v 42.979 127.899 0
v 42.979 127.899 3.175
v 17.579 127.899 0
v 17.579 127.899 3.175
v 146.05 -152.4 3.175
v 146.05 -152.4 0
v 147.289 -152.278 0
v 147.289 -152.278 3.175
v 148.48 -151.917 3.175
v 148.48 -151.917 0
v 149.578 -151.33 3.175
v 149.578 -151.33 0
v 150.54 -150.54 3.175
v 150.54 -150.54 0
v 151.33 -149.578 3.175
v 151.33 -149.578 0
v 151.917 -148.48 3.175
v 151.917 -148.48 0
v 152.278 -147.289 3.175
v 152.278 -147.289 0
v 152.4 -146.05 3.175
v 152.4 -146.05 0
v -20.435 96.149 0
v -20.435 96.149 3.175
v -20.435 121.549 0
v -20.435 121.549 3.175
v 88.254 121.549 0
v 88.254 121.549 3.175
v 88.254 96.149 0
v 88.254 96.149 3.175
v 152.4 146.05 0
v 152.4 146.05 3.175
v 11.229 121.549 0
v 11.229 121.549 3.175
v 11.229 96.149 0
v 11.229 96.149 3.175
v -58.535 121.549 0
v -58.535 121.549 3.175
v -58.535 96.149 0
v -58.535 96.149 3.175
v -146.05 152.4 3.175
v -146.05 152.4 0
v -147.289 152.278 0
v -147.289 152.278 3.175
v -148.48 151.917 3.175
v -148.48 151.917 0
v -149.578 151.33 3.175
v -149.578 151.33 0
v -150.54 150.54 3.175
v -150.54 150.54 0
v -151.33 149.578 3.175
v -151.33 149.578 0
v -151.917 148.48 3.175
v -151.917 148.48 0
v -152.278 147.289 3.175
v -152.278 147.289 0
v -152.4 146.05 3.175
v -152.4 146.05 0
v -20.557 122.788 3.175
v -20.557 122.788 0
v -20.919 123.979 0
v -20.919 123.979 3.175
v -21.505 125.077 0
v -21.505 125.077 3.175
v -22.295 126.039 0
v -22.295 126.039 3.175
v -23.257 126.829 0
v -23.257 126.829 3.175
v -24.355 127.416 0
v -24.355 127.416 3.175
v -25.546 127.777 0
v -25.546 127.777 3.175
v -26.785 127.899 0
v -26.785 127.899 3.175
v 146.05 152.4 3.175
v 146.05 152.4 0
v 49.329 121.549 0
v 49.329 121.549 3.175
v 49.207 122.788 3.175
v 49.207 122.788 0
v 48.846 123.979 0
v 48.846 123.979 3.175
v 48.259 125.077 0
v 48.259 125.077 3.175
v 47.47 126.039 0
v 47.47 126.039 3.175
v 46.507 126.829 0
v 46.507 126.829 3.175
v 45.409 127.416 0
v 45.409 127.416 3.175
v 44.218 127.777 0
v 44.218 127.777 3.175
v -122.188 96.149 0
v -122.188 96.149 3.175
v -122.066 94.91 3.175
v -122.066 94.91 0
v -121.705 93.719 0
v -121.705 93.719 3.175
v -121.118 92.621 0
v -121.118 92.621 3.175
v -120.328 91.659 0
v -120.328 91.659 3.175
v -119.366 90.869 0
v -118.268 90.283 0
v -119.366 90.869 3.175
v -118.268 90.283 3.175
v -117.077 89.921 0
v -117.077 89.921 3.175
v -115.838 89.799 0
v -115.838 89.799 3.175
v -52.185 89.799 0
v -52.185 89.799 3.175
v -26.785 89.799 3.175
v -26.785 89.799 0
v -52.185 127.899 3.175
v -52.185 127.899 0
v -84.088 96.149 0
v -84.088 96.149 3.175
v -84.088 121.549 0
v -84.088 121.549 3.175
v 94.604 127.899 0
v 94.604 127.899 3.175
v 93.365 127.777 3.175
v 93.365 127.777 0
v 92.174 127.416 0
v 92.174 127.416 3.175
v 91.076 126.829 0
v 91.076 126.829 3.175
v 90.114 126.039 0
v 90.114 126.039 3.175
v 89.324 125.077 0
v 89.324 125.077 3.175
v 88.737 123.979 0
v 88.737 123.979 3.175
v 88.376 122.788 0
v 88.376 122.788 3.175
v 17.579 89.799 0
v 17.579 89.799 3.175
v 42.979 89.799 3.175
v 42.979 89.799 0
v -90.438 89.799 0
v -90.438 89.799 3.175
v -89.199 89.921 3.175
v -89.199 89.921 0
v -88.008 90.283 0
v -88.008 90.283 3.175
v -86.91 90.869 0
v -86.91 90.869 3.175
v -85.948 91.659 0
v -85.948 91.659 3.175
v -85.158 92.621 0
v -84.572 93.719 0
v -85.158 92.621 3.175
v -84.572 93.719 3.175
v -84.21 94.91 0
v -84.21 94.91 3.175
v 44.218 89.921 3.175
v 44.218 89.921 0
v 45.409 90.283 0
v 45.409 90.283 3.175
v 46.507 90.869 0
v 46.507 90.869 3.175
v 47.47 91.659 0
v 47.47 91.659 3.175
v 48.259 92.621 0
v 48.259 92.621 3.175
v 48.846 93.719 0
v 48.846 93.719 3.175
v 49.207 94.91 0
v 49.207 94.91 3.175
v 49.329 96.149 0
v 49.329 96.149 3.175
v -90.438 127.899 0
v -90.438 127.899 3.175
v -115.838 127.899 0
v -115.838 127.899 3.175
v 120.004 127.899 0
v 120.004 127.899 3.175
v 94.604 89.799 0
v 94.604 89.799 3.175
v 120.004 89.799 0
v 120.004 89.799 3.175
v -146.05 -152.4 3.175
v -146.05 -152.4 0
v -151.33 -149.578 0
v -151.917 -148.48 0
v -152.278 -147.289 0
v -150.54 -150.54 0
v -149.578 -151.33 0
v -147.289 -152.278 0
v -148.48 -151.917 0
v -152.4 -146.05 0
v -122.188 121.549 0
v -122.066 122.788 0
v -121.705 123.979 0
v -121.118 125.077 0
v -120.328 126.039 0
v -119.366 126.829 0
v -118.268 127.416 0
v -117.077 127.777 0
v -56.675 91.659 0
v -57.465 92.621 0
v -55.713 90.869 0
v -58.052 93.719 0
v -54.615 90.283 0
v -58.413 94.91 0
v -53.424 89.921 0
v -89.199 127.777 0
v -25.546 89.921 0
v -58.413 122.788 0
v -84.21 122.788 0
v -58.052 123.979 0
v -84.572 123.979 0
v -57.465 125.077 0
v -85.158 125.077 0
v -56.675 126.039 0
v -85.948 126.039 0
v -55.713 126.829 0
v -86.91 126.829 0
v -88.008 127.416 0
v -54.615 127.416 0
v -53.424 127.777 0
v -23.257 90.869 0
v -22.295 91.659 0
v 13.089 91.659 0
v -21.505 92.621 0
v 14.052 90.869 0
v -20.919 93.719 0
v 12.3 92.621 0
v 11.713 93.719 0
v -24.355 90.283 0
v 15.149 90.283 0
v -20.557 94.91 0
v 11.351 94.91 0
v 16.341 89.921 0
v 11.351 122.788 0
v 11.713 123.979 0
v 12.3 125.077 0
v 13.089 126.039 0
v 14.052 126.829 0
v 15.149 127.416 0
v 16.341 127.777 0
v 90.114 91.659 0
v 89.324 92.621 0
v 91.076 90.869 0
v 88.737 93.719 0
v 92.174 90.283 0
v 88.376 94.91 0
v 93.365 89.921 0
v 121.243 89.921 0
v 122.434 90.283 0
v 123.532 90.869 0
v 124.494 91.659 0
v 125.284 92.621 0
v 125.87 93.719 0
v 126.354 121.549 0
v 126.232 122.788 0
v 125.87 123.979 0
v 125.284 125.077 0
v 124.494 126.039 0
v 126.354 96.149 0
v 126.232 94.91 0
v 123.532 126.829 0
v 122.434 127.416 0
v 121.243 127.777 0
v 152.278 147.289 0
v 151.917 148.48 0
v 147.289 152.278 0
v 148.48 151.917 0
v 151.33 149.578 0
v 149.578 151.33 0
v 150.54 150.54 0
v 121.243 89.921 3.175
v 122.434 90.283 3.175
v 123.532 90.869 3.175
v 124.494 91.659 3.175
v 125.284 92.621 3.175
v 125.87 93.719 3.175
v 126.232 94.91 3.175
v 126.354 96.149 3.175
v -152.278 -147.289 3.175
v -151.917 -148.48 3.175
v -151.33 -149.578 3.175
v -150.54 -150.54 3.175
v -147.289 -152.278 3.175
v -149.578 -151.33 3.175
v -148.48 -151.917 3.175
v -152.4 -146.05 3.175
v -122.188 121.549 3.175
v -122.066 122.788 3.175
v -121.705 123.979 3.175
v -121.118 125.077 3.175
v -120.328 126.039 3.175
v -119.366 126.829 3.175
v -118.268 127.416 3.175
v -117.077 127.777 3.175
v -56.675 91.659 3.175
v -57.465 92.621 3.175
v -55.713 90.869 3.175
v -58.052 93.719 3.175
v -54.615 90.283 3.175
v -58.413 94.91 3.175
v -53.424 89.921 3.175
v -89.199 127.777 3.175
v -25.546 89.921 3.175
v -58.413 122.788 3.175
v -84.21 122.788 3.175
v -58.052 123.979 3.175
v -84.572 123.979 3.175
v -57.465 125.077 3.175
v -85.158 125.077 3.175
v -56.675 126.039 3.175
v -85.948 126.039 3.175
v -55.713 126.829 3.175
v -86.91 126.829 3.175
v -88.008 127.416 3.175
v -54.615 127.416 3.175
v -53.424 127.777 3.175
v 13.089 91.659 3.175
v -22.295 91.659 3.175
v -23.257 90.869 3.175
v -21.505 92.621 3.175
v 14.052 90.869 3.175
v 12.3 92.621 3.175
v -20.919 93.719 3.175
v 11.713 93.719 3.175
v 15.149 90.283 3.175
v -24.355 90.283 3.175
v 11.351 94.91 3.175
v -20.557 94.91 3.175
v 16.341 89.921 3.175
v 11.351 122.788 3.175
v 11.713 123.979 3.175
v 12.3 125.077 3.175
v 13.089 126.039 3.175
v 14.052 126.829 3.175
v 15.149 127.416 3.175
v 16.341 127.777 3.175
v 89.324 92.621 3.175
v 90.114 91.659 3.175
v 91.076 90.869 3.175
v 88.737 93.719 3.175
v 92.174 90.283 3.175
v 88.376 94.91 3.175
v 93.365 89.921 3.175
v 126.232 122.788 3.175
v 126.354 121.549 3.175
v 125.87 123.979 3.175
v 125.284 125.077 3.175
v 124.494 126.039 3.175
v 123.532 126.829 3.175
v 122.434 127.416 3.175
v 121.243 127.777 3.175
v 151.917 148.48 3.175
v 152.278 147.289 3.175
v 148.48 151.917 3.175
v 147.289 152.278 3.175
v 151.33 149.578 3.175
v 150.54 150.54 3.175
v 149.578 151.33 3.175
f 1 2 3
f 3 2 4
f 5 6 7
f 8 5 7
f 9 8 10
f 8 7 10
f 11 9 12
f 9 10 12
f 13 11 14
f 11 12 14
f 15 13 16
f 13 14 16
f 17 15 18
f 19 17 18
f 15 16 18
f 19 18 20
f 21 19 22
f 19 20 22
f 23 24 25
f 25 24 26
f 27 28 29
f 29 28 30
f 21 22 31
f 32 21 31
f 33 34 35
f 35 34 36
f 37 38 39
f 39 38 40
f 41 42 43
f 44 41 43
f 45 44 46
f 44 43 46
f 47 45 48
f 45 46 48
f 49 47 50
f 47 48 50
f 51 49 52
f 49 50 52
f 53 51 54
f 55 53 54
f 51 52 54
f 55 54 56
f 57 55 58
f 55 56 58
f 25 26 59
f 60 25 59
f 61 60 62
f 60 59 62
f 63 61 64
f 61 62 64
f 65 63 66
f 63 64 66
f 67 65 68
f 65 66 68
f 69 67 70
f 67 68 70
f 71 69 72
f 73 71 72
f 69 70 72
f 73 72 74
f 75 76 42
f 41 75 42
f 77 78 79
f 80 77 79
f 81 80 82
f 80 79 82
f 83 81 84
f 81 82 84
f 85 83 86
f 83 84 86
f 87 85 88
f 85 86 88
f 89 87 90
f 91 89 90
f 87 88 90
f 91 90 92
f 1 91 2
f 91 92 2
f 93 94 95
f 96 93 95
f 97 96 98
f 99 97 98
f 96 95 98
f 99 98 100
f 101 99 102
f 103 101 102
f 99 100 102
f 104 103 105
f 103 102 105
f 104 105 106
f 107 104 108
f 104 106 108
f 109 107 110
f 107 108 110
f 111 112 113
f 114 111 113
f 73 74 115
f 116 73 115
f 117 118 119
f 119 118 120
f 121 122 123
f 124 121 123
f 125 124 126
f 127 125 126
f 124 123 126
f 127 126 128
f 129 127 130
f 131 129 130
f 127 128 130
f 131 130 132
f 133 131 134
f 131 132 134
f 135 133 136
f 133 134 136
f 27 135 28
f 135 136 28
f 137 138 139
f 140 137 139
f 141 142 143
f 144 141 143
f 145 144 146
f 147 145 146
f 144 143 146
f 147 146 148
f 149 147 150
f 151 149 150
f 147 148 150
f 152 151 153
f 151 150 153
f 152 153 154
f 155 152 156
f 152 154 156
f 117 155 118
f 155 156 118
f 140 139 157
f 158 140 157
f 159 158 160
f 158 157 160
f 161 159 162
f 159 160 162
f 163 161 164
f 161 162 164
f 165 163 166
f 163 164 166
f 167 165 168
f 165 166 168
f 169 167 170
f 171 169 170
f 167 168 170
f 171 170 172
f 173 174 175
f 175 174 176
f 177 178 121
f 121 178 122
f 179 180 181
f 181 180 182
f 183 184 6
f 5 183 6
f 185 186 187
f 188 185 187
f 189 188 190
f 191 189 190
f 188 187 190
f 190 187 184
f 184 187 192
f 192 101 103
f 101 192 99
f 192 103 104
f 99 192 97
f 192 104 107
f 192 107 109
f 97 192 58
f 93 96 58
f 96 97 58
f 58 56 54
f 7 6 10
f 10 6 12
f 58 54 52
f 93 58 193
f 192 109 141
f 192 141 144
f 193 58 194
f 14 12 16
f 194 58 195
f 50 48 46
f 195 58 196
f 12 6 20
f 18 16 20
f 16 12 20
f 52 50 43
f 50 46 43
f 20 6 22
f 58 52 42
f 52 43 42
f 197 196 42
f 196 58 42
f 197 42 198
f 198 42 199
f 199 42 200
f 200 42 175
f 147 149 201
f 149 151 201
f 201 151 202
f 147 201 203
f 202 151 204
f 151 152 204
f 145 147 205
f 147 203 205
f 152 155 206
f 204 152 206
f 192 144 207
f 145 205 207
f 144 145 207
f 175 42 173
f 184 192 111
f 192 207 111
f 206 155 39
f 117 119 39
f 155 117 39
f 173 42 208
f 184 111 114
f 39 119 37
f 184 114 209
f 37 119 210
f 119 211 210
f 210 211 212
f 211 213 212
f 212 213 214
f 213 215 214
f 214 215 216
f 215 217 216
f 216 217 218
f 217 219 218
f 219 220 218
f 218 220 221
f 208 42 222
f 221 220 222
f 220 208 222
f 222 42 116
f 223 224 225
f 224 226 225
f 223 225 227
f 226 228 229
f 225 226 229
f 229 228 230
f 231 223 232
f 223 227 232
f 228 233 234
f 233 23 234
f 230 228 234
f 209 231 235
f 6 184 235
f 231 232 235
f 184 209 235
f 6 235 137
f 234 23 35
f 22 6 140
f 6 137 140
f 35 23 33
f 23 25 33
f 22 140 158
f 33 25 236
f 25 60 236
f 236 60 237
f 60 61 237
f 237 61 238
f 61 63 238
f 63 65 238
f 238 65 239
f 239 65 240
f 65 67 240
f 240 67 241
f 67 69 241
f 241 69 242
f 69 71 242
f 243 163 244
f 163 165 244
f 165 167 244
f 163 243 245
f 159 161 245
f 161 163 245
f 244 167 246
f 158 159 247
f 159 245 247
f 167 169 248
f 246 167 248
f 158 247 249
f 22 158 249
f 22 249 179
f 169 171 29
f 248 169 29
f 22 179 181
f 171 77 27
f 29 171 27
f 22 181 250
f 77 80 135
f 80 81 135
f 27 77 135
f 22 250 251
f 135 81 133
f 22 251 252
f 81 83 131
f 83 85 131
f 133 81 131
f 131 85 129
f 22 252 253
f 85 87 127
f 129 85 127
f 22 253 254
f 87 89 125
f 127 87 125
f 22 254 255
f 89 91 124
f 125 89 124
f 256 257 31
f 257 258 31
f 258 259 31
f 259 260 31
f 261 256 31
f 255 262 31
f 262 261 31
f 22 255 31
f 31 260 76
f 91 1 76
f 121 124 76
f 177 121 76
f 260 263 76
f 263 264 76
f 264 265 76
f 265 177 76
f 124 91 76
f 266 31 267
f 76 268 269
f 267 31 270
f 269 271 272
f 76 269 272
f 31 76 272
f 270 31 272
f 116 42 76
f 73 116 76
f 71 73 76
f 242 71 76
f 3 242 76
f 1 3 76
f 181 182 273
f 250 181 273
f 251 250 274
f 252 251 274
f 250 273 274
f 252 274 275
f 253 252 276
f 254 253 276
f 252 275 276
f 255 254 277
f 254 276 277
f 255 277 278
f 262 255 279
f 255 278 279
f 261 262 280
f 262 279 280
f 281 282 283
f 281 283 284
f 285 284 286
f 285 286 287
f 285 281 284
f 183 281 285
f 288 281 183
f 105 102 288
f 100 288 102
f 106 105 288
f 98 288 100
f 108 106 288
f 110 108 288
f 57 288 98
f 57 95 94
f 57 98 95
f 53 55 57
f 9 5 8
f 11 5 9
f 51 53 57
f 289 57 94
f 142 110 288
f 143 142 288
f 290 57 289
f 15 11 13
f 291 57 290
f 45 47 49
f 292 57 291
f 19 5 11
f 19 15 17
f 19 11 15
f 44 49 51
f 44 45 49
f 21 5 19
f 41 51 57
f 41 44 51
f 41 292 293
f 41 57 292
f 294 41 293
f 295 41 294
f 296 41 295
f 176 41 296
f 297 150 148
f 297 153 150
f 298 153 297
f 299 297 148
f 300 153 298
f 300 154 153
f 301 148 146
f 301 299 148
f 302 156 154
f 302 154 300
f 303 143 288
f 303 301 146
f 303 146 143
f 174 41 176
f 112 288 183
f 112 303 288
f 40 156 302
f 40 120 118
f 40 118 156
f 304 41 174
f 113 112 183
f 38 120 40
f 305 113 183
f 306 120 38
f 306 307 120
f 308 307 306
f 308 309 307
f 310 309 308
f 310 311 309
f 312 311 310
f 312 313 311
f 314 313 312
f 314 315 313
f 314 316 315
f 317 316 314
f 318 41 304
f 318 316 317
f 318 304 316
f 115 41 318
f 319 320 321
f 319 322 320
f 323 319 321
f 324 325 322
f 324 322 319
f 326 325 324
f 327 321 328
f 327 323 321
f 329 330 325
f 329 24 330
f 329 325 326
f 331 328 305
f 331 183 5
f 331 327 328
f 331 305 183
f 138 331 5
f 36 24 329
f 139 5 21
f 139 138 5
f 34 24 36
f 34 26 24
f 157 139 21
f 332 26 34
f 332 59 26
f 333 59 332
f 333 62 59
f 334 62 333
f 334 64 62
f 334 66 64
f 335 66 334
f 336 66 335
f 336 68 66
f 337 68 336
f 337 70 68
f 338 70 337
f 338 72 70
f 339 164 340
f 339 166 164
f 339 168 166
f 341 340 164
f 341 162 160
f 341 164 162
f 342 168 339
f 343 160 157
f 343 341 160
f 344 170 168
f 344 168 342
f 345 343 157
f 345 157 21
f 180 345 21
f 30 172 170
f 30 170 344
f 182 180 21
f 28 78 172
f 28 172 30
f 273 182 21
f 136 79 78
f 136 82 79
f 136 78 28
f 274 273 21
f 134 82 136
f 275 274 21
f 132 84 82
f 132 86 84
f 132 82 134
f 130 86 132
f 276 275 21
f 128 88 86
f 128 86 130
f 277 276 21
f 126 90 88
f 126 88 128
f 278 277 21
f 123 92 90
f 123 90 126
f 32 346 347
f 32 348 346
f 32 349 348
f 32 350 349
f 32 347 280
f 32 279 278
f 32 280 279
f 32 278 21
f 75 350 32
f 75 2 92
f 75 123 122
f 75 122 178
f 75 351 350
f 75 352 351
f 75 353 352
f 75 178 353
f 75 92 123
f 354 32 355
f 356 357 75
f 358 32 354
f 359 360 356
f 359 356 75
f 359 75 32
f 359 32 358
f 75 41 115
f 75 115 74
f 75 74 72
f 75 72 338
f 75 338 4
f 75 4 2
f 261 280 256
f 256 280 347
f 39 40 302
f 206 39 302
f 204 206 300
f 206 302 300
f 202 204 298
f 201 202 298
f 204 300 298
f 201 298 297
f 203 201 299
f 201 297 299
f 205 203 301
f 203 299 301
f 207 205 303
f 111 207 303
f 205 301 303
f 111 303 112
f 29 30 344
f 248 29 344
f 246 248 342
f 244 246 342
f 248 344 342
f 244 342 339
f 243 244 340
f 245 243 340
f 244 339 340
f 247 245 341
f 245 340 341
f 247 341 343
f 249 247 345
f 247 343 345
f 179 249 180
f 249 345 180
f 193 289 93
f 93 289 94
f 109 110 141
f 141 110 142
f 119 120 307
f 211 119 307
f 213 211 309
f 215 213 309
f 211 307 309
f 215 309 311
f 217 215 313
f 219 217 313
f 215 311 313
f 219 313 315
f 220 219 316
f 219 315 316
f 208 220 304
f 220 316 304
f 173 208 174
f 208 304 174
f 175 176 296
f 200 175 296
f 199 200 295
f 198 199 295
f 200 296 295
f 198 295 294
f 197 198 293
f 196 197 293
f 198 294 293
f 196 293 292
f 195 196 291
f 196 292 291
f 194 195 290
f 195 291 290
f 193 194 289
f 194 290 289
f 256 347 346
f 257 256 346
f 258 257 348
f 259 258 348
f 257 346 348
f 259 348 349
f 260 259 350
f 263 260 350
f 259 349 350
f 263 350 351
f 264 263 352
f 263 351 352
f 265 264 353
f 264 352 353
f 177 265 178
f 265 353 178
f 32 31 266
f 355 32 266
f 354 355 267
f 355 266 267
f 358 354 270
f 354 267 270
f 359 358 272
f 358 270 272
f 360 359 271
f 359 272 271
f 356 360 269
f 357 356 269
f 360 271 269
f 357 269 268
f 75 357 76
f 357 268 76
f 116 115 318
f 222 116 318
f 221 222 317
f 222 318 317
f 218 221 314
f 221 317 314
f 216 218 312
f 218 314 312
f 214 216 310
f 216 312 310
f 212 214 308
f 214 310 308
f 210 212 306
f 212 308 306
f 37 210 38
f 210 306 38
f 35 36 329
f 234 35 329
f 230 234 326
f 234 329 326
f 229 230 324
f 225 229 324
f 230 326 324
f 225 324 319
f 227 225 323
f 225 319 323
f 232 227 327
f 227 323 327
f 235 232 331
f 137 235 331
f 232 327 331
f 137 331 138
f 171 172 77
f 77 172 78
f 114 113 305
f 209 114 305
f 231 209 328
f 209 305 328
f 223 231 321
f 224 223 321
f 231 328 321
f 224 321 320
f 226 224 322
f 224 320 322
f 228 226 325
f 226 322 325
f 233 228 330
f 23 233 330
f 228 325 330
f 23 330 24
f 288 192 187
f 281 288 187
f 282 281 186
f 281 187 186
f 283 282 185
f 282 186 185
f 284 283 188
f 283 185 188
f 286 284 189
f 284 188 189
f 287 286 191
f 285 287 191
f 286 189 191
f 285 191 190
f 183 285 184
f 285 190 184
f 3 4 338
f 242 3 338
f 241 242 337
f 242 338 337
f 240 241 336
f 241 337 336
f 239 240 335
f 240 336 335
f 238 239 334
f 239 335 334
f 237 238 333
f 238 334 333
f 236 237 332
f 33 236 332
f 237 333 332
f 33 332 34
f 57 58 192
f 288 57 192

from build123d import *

# Parameters (mm, degrees)
F1_DEPTH = 3.175
F3_DEPTH = 3.175


with BuildPart() as f1:
    # F0 (on Top) → F1 (new body)
    with BuildSketch(Plane.XY):
        with BuildLine():
            ThreePointArc((152.4, 146.05), (150.540128, 150.540128), (146.05, 152.4))
            Line((146.05, 152.4), (-146.05, 152.4))
            ThreePointArc((-146.05, 152.4), (-150.540128, 150.540128), (-152.4, 146.05))
            Line((-152.4, 146.05), (-152.4, -146.05))
            ThreePointArc((-152.4, -146.05), (-150.540128, -150.540128), (-146.05, -152.4))
            Line((-146.05, -152.4), (146.05, -152.4))
            ThreePointArc((146.05, -152.4), (150.540128, -150.540128), (152.4, -146.05))
            Line((152.4, -146.05), (152.4, 146.05))
        make_face()
    extrude(amount=F1_DEPTH)

    # F2 (on face) → F3 (cut, through all)
    with BuildSketch(Plane.XY.offset(3.175)):
        with BuildLine():
            Line((-115.838222, 89.799137), (-90.438222, 89.799137))
            ThreePointArc((-90.438222, 89.799137), (-85.948094, 91.659008), (-84.088222, 96.149137))
            Line((-84.088222, 96.149137), (-84.088222, 121.549137))
            ThreePointArc((-84.088222, 121.549137), (-85.948094, 126.039265), (-90.438222, 127.899137))
            Line((-90.438222, 127.899137), (-115.838222, 127.899137))
            ThreePointArc((-115.838222, 127.899137), (-120.32835, 126.039265), (-122.188222, 121.549137))
            Line((-122.188222, 121.549137), (-122.188222, 96.149137))
            ThreePointArc((-122.188222, 96.149137), (-120.32835, 91.659008), (-115.838222, 89.799137))
        make_face()
        with BuildLine():
            Line((-52.185156, 89.799137), (-26.785156, 89.799137))
            ThreePointArc((-26.785156, 89.799137), (-22.295028, 91.659008), (-20.435156, 96.149137))
            Line((-20.435156, 96.149137), (-20.435156, 121.549137))
            ThreePointArc((-20.435156, 121.549137), (-22.295028, 126.039265), (-26.785156, 127.899137))
            Line((-26.785156, 127.899137), (-52.185156, 127.899137))
            ThreePointArc((-52.185156, 127.899137), (-56.675284, 126.039265), (-58.535156, 121.549137))
            Line((-58.535156, 121.549137), (-58.535156, 96.149137))
            ThreePointArc((-58.535156, 96.149137), (-56.675284, 91.659008), (-52.185156, 89.799137))
        make_face()
        with BuildLine():
            Line((94.603679, 89.799137), (120.003679, 89.799137))
            ThreePointArc((120.003679, 89.799137), (124.493807, 91.659008), (126.353679, 96.149137))
            Line((126.353679, 96.149137), (126.353679, 121.549137))
            ThreePointArc((126.353679, 121.549137), (124.493807, 126.039265), (120.003679, 127.899137))
            Line((120.003679, 127.899137), (94.603679, 127.899137))
            ThreePointArc((94.603679, 127.899137), (90.113551, 126.039265), (88.253679, 121.549137))
            Line((88.253679, 121.549137), (88.253679, 96.149137))
            ThreePointArc((88.253679, 96.149137), (90.113551, 91.659008), (94.603679, 89.799137))
        make_face()
        with BuildLine():
            Line((17.579446, 89.799137), (42.979446, 89.799137))
            ThreePointArc((42.979446, 89.799137), (47.469574, 91.659008), (49.329446, 96.149137))
            Line((49.329446, 96.149137), (49.329446, 121.549137))
            ThreePointArc((49.329446, 121.549137), (47.469574, 126.039265), (42.979446, 127.899137))
            Line((42.979446, 127.899137), (17.579446, 127.899137))
            ThreePointArc((17.579446, 127.899137), (13.089318, 126.039265), (11.229446, 121.549137))
            Line((11.229446, 121.549137), (11.229446, 96.149137))
            ThreePointArc((11.229446, 96.149137), (13.089318, 91.659008), (17.579446, 89.799137))
        make_face()
    extrude(amount=-F3_DEPTH, mode=Mode.SUBTRACT)


solid = f1.part
